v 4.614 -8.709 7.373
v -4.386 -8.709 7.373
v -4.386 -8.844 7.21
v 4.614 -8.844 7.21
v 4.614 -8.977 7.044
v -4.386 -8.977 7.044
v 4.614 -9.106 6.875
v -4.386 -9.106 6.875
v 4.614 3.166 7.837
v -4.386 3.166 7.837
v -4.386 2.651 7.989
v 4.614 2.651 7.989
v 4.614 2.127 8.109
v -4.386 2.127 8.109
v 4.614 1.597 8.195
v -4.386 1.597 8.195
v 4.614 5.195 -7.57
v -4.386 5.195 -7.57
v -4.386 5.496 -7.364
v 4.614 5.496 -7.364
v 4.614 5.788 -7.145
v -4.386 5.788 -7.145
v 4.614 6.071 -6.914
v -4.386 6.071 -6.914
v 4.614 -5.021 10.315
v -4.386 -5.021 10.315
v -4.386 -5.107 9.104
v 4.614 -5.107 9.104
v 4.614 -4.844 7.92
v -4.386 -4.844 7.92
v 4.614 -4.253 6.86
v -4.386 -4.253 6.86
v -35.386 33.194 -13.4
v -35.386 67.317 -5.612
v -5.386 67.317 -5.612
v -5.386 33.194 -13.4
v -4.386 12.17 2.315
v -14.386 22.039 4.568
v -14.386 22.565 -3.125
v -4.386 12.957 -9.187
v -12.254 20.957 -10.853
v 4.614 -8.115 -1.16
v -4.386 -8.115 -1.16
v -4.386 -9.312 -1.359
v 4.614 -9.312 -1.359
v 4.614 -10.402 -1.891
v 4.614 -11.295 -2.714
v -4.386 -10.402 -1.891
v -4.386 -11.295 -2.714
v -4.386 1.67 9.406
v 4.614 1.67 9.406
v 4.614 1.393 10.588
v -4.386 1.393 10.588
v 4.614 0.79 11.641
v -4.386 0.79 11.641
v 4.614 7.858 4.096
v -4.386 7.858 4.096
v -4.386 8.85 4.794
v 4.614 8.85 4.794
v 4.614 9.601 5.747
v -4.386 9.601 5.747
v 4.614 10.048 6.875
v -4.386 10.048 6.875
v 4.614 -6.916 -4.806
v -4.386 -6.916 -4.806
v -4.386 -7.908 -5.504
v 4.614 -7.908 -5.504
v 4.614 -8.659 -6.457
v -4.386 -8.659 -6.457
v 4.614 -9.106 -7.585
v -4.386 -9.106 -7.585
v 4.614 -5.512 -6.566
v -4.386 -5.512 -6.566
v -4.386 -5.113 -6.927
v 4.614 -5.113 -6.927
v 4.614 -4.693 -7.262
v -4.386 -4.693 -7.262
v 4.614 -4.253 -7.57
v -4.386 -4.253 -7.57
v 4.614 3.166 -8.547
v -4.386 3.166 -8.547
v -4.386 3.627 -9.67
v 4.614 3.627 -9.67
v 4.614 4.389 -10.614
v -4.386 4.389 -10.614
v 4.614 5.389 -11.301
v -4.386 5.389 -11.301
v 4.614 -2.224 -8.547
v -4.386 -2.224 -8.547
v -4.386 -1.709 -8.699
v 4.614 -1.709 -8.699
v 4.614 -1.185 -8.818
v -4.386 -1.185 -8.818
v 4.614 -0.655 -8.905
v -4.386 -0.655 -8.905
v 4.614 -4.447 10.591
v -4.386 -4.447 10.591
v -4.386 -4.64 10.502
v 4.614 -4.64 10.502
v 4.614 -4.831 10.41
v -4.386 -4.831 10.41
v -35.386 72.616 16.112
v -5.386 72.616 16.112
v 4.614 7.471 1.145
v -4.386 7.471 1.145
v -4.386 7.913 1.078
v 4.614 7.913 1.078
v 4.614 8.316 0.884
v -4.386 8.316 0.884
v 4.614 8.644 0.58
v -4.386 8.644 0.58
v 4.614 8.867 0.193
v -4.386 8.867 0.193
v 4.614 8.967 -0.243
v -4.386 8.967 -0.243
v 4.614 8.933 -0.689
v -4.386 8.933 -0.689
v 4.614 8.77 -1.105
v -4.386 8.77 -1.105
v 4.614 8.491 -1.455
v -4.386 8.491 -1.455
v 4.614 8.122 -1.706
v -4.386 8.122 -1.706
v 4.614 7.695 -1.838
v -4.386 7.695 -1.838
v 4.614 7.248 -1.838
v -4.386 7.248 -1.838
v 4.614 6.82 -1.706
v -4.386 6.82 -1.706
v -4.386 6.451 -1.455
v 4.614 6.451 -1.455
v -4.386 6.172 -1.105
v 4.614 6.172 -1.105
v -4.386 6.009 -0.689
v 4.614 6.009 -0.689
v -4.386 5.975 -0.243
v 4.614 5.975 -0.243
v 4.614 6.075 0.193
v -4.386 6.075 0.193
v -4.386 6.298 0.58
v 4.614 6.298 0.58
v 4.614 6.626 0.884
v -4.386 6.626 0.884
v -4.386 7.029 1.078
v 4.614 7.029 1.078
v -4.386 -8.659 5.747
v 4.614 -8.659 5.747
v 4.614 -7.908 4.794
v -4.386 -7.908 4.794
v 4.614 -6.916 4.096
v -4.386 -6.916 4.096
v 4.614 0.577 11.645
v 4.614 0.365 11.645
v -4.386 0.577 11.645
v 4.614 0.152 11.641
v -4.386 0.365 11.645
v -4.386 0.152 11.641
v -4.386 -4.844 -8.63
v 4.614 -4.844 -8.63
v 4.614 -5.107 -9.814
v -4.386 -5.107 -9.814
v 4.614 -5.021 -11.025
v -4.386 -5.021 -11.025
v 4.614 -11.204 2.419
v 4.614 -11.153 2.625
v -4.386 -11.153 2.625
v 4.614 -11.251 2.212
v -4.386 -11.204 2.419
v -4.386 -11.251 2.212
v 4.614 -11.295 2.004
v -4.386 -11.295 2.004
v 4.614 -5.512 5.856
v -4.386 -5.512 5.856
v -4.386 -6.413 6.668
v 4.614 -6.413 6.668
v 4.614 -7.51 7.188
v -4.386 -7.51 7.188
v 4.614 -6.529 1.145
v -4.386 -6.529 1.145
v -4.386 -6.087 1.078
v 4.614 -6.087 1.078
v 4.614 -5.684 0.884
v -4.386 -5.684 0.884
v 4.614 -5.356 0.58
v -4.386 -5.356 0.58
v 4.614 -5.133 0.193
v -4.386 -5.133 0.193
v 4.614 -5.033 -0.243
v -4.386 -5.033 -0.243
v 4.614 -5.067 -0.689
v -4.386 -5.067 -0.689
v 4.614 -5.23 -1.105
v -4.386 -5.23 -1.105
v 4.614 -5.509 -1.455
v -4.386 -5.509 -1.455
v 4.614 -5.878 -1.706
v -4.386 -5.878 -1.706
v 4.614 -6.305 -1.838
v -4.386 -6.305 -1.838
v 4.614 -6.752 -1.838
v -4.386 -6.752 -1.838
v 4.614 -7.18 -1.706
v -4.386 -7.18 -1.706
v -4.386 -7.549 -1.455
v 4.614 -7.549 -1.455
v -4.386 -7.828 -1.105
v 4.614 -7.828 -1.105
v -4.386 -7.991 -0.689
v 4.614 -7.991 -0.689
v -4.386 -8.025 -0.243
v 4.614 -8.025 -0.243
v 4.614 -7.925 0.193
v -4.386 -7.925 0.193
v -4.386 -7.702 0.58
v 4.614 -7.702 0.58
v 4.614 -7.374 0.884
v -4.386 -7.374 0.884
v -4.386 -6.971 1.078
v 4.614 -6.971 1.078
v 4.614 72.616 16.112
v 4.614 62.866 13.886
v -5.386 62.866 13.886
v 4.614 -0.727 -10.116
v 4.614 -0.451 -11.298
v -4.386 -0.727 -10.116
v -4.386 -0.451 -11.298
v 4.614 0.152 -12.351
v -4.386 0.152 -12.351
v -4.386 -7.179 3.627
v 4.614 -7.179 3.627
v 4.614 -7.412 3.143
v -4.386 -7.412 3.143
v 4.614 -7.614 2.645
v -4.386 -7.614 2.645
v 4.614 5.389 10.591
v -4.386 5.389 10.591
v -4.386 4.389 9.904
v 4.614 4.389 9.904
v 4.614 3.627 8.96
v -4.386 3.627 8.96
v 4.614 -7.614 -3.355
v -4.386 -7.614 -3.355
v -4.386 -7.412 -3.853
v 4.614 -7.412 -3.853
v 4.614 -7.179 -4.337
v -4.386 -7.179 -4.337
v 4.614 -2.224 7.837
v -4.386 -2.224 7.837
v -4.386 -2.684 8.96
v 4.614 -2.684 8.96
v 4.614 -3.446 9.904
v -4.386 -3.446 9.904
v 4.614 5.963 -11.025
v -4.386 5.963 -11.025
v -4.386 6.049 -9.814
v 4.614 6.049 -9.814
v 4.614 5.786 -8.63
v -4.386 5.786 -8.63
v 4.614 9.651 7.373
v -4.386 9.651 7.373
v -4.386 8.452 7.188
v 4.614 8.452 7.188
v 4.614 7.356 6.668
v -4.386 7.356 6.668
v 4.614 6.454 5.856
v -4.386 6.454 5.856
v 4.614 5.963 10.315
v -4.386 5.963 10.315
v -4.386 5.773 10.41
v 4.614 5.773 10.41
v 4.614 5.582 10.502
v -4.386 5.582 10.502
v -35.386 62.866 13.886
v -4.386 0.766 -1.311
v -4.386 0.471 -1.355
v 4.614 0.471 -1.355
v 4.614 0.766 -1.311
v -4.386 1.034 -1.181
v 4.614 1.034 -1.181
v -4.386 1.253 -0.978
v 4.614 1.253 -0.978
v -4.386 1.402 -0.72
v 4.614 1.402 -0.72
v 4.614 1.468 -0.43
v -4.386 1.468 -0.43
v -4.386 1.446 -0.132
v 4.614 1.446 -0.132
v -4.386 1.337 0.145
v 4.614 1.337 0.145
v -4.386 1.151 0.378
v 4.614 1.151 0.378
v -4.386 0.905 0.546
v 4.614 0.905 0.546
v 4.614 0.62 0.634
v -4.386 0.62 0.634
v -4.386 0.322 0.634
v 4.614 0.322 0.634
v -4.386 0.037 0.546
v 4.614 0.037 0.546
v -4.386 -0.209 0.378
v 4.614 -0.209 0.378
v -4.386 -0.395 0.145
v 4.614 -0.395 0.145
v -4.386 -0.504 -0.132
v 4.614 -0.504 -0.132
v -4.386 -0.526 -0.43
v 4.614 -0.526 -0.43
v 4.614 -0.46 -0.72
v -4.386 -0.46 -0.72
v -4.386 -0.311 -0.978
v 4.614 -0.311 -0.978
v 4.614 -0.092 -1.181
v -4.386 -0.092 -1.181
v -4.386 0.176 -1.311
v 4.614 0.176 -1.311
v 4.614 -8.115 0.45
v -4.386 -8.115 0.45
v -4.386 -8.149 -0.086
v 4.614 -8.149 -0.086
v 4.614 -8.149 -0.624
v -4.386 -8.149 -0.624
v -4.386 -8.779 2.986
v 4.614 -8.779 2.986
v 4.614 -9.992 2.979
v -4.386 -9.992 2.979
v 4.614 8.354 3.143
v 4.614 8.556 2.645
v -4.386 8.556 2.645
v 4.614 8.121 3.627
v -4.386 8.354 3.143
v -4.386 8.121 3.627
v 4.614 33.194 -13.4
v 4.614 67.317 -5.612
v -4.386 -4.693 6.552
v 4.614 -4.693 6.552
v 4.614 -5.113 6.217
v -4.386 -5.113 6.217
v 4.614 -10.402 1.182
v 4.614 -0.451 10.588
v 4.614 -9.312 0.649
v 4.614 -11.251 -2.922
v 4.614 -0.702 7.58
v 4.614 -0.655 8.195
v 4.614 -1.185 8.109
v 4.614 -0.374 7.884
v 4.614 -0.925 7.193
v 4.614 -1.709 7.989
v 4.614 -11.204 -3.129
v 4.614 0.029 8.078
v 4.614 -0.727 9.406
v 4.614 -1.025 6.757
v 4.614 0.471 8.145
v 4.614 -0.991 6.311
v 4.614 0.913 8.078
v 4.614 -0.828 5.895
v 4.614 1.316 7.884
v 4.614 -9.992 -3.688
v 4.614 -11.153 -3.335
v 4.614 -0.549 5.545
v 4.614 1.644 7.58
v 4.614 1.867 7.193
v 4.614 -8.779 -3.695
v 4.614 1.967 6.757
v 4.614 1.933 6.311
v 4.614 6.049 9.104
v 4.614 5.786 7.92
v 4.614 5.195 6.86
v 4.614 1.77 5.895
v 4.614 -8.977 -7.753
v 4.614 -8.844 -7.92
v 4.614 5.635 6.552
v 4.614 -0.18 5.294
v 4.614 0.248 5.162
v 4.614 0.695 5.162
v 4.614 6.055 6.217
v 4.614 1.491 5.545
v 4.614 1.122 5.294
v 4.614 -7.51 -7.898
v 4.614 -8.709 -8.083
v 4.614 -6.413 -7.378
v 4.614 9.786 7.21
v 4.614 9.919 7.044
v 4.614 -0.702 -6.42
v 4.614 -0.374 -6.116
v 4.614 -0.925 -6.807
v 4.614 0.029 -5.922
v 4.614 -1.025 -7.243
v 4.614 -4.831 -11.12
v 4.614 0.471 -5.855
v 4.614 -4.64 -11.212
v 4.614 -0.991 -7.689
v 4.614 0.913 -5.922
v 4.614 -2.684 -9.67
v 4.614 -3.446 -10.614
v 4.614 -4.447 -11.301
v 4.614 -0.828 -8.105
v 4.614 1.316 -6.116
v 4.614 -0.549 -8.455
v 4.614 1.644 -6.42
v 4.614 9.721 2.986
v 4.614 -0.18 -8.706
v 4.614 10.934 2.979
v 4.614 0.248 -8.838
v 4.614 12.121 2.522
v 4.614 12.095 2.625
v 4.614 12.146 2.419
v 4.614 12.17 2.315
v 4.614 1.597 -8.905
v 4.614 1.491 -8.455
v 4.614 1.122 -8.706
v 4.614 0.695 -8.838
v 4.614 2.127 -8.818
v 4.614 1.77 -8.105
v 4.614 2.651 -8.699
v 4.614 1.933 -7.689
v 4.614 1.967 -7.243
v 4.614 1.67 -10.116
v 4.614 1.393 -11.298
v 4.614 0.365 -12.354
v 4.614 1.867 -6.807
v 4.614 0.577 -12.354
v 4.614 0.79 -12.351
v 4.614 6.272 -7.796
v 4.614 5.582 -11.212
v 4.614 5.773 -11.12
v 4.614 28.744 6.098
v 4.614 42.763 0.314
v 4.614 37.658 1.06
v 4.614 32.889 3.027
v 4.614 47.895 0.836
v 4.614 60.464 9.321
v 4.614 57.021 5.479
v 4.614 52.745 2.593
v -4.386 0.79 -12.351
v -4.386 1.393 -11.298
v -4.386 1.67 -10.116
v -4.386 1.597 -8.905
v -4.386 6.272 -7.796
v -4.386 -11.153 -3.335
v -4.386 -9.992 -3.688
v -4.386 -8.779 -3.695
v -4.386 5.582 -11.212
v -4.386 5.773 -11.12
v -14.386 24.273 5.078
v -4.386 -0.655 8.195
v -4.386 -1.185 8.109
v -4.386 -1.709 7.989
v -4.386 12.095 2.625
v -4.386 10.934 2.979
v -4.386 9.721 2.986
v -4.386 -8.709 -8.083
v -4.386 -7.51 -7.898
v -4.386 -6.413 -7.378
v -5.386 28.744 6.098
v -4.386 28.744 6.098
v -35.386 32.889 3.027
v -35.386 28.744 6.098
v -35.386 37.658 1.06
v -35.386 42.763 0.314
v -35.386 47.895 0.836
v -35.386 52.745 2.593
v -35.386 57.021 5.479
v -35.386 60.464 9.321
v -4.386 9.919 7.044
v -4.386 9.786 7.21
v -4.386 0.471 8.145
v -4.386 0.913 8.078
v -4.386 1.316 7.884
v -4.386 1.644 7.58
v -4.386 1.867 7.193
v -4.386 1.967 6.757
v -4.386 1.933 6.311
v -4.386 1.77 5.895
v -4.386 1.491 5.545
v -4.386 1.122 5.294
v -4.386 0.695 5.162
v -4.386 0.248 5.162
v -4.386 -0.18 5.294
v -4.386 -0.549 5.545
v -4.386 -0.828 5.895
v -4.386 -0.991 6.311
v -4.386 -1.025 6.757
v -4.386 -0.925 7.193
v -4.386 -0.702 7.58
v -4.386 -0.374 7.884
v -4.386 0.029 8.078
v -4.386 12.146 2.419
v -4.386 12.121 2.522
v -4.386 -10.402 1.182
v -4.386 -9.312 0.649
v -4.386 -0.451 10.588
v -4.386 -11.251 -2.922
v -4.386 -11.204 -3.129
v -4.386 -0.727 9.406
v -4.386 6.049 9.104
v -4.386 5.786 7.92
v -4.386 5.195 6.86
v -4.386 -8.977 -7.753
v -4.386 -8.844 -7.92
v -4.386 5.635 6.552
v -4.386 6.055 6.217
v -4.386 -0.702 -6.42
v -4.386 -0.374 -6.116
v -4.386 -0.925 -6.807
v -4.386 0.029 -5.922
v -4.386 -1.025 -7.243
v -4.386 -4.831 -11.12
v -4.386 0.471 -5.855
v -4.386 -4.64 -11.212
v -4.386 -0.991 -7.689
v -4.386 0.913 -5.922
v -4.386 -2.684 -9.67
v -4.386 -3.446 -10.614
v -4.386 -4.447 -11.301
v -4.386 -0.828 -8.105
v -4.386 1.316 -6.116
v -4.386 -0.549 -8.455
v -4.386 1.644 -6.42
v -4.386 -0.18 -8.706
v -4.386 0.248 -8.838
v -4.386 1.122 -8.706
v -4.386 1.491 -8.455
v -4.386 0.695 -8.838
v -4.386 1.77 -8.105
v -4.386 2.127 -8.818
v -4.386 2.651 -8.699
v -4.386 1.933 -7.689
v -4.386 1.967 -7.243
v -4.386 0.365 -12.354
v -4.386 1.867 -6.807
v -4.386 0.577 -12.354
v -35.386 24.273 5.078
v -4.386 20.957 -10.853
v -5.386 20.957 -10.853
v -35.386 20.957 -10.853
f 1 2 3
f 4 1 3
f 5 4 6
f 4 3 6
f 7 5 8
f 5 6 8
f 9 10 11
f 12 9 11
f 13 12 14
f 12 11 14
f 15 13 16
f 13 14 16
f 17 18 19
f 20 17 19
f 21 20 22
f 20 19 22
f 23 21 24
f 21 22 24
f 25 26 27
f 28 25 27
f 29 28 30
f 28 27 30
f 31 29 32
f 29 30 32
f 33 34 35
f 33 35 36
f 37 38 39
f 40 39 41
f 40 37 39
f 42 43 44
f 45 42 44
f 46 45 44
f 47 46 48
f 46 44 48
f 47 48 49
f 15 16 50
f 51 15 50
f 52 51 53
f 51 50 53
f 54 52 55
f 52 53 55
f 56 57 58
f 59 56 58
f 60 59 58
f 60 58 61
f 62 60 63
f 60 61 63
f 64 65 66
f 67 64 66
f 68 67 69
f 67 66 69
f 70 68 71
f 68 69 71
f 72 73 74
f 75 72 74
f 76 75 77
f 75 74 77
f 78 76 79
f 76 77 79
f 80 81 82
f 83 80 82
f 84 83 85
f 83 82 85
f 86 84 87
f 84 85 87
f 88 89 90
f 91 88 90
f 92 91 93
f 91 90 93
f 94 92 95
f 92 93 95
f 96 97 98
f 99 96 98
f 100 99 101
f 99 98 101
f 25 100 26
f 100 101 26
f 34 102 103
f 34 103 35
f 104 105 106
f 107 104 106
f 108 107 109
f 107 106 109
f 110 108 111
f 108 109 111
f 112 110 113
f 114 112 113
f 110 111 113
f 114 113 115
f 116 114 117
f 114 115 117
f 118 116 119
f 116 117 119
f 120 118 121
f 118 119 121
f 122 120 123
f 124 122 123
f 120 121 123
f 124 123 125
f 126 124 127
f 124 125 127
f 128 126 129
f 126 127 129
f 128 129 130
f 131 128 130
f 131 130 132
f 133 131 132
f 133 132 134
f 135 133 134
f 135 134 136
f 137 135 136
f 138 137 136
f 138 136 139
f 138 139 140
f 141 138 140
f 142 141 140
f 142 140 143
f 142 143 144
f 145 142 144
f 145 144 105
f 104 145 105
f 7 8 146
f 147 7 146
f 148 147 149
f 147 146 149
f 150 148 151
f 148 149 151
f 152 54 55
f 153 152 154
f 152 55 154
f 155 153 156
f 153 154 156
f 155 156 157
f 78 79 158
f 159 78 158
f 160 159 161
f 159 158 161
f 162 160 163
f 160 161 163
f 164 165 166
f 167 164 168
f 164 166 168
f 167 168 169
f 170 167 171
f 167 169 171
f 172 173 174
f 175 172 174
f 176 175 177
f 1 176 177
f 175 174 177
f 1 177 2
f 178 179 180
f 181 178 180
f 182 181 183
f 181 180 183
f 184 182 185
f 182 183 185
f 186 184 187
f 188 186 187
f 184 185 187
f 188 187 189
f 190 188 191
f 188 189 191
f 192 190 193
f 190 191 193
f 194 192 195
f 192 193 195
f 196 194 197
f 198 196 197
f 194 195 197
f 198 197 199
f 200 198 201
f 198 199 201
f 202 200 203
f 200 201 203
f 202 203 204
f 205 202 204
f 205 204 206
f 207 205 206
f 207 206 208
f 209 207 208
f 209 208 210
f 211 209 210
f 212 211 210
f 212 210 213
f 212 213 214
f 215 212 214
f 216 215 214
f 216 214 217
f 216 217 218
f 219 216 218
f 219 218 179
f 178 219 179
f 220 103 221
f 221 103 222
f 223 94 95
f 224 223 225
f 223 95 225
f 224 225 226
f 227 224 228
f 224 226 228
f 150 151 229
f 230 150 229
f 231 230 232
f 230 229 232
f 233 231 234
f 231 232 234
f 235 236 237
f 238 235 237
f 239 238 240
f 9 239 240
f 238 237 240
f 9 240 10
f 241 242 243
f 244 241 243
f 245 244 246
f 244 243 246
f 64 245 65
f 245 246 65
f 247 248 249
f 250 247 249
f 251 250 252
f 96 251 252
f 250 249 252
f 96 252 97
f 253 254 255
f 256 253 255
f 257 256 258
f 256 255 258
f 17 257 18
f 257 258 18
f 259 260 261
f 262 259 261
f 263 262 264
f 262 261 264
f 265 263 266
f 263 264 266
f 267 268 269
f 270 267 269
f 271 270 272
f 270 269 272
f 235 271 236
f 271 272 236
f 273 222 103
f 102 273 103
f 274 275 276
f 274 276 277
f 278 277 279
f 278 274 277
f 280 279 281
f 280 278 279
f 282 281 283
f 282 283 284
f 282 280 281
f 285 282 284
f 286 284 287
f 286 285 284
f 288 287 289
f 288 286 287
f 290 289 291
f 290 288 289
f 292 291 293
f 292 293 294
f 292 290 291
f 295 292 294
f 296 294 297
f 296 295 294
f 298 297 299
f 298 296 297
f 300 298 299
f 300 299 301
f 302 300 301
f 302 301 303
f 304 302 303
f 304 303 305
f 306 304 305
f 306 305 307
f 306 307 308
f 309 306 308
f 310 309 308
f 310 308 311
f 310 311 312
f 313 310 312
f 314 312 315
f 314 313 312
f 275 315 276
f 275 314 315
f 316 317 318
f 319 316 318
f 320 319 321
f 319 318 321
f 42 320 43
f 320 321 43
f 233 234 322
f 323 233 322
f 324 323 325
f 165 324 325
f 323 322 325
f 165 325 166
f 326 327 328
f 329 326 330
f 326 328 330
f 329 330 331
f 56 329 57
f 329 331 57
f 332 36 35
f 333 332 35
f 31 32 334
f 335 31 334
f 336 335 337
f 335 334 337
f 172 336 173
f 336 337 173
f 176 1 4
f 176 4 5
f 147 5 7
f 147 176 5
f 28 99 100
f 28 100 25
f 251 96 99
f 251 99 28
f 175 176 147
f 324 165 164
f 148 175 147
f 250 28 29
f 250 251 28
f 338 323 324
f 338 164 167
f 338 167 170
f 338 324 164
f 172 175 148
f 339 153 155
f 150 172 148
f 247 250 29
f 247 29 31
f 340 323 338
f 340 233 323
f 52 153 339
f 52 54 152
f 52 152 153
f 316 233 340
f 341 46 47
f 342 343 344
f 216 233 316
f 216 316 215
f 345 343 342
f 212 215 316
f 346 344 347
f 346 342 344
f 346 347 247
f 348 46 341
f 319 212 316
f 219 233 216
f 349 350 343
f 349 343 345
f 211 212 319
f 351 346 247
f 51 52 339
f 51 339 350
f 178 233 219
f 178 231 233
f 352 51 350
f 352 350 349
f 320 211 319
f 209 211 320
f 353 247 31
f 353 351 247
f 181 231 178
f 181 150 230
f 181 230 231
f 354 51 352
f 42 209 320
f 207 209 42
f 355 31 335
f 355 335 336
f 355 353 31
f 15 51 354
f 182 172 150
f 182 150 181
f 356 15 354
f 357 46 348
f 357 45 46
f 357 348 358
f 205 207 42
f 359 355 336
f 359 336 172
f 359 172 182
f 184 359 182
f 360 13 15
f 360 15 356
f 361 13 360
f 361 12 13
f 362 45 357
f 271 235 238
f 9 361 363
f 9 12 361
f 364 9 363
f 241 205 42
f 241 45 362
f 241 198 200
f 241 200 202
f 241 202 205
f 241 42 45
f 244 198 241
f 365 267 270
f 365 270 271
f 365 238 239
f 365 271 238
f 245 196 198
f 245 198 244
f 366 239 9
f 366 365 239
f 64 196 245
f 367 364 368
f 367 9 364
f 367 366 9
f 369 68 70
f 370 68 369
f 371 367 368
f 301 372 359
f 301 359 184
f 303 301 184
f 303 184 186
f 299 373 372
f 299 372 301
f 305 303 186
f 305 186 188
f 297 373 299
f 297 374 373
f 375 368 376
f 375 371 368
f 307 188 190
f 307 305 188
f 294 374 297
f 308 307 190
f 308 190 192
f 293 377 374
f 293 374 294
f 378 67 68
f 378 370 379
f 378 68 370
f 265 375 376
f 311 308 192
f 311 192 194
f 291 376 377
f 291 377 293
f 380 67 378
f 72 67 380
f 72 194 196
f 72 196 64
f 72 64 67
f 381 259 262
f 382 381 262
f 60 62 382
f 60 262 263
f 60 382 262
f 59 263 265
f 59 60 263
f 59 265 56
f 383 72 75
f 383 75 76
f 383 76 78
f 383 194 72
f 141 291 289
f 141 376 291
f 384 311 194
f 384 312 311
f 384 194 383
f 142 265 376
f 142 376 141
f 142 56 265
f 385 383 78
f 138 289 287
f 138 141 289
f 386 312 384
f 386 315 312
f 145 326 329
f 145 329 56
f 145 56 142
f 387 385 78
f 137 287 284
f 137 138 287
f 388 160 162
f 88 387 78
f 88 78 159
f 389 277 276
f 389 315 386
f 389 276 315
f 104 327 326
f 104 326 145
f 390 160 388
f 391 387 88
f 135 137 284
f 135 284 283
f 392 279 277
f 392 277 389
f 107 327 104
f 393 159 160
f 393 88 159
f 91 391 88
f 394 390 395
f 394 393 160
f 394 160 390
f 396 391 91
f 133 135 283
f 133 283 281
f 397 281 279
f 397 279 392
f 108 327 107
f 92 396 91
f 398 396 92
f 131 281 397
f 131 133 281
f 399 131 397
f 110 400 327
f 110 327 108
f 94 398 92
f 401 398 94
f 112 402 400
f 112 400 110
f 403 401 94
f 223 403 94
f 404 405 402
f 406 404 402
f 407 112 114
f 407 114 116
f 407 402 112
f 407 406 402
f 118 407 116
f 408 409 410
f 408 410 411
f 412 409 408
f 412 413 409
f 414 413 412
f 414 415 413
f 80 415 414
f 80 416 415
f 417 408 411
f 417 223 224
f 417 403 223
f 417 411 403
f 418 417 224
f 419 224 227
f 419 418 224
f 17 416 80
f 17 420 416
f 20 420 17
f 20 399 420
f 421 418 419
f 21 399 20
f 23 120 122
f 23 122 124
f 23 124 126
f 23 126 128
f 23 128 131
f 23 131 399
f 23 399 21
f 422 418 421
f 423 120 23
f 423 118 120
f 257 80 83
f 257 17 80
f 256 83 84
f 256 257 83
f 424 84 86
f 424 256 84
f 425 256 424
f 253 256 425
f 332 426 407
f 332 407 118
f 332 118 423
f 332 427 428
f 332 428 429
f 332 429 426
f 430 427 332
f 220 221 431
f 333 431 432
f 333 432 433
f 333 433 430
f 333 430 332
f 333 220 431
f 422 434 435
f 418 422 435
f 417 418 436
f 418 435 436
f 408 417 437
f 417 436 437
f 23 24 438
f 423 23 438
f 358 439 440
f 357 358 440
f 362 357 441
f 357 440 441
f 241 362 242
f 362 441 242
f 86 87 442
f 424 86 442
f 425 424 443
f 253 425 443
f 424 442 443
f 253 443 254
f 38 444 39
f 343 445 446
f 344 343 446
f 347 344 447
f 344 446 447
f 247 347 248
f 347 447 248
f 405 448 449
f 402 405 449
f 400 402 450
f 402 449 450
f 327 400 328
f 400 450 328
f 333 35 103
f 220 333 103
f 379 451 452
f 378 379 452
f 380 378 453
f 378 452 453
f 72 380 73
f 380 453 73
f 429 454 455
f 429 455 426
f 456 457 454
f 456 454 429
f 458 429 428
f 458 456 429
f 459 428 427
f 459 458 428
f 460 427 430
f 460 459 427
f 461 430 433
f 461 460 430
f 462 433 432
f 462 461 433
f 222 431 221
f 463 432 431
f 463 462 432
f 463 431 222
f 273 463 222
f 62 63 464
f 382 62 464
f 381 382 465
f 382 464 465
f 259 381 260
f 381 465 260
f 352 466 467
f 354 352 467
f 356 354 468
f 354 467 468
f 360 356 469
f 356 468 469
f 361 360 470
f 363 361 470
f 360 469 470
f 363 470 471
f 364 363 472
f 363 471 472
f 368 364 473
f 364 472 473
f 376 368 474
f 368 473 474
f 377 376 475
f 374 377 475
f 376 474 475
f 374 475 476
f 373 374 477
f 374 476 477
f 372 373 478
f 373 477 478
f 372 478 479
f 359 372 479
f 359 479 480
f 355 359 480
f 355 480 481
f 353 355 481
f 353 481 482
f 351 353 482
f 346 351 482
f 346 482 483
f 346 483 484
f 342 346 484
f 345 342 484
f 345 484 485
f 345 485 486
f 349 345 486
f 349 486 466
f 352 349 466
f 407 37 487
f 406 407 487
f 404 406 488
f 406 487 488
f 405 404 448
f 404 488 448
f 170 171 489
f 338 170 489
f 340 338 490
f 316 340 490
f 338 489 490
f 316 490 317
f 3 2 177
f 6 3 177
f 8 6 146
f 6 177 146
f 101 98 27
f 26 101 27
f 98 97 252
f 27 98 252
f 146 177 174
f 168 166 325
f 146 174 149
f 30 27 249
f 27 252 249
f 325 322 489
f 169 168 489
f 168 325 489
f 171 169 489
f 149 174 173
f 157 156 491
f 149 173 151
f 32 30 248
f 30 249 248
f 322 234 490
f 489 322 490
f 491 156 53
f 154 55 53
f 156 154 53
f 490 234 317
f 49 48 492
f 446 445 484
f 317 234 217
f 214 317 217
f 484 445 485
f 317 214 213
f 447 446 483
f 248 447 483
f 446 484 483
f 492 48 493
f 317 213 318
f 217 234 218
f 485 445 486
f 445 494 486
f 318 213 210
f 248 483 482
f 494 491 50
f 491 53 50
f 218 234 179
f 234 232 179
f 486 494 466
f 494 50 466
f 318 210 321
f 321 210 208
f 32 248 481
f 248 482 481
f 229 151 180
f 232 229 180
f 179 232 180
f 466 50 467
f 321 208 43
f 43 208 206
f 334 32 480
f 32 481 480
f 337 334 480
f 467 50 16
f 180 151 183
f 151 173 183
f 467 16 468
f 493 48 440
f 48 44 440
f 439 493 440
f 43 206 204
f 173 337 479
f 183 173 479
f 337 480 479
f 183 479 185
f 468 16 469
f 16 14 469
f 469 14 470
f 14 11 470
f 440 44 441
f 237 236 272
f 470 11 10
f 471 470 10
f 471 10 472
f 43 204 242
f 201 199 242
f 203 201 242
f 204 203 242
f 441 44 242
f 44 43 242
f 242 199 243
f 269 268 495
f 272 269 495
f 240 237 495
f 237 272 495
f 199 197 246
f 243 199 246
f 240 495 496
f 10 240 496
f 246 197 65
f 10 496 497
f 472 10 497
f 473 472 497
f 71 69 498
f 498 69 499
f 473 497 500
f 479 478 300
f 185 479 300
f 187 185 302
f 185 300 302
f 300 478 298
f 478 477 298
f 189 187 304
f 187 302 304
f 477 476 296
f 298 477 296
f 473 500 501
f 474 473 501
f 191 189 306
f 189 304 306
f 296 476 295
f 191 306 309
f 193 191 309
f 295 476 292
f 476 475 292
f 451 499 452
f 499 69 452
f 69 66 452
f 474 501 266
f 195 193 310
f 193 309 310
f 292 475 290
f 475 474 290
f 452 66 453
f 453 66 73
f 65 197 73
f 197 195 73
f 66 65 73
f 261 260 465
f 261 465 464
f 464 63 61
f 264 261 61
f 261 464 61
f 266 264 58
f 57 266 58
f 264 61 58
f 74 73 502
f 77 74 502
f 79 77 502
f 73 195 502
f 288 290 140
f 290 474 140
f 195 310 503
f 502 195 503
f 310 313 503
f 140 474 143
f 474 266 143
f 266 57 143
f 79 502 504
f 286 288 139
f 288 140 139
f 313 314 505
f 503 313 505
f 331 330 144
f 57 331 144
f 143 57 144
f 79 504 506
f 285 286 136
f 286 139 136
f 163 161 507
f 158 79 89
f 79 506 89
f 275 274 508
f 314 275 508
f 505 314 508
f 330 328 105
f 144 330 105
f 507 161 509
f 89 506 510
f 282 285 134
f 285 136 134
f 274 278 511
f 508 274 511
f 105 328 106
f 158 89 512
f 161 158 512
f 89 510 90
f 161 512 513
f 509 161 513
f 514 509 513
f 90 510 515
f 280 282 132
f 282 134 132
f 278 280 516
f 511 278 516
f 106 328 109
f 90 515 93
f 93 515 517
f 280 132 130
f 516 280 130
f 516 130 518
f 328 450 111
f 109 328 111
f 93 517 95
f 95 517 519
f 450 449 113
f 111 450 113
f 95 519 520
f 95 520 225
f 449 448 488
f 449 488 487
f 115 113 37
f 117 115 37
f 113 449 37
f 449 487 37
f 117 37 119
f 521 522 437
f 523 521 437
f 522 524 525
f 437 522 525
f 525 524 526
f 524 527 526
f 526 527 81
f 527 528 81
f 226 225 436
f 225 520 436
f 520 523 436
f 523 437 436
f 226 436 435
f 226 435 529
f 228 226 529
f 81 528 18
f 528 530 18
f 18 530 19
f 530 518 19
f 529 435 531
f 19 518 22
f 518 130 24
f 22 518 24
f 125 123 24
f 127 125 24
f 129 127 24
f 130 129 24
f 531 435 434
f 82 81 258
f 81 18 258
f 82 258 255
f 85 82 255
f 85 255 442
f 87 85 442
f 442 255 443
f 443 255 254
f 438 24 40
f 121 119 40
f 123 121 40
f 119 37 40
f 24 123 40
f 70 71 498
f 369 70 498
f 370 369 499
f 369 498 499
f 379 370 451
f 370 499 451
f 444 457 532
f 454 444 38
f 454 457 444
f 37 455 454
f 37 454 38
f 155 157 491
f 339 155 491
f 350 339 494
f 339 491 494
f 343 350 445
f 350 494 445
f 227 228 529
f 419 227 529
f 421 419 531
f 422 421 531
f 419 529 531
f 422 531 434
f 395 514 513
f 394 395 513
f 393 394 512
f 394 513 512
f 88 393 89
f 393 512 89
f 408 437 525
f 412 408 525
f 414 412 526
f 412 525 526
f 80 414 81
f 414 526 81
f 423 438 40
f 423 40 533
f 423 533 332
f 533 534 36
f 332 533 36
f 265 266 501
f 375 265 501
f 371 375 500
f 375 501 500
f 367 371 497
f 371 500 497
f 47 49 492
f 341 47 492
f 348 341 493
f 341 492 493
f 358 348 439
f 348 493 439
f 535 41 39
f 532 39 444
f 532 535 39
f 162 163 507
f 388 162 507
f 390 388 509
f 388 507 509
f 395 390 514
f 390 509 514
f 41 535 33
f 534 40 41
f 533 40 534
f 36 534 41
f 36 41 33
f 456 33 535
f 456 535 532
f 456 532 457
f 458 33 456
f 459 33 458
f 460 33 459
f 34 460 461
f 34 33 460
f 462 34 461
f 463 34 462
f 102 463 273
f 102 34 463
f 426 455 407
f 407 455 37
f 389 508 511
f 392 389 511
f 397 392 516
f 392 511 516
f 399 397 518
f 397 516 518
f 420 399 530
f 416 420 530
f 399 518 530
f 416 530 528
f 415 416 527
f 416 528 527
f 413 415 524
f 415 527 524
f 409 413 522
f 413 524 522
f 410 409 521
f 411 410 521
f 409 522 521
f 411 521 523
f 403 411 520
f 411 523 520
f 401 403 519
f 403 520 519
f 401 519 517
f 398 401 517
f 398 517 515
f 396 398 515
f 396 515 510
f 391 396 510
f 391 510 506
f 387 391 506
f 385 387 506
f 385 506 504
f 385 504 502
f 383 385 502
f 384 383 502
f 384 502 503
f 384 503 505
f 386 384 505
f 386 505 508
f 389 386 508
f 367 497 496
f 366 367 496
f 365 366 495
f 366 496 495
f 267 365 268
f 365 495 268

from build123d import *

# Parameters (mm, degrees)
BOSS_EXTRUDE1_START     = -9
BOSS_EXTRUDE1_OUTLINE_R = 1
BOSS_EXTRUDE1_DEPTH     = 9
BOSS_EXTRUDE1_START_2   = -10
BOSS_EXTRUDE1_2_DEPTH   = 1
BOSS_EXTRUDE2_START     = -40
BOSS_EXTRUDE2_DEPTH     = 40
CUT_EXTRUDE6_DEPTH      = 31
BOSS_EXTRUDE5_DEPTH     = 10
CHAMFER5_SIZE           = 10
SKETCH17_R              = 1.5000000000000002
SKETCH17_R_2            = 1.5000000000000004
SKETCH17_R_3            = 1.5
CUT_EXTRUDE7_DEPTH      = 81.58306320285853


with BuildPart() as part:
    # Boss-Extrude1: read off the stored shape, not the designer's step
    # Boss-Extrude1 outline → Boss-Extrude1 (new body)
    with BuildSketch(Plane(origin=(4.6139639648499715, 0, 0), x_dir=(0, 0, -1), z_dir=(1, 0, 0)).offset(BOSS_EXTRUDE1_START)):
        with BuildLine():
            ThreePointArc((-10.591117285, -4.446613705), (-10.456680456, -4.73552608), (-10.314619658, -5.020766944))
            ThreePointArc((-10.314619658, -5.020766944), (-8.502494616, -5.018593908), (-6.859954563, -4.253176333))
            ThreePointArc((-6.859954563, -4.253176333), (-6.387568746, -4.905897262), (-5.856328627, -5.51168345))
            ThreePointArc((-5.856328627, -5.51168345), (-6.968055133, -6.942720161), (-7.373409443, -8.708927899))
            ThreePointArc((-7.373409443, -8.708927899), (-7.126931664, -8.910899), (-6.875177934, -9.106254268))
            ThreePointArc((-6.875177934, -9.106254268), (-5.243452532, -8.318044841), (-4.095677319, -6.915756016))
            ThreePointArc((-4.095677319, -6.915756016), (-3.386867407, -7.298876727), (-2.645395822, -7.614174775))
            ThreePointArc((-2.645395822, -7.614174775), (-3.026123234, -9.385854353), (-2.625006031, -11.153029182))
            ThreePointArc((-2.625006031, -11.153029182), (-2.315305249, -11.228056157), (-2.003721502, -11.294833322))
            ThreePointArc((-2.003721502, -11.294833322), (-0.875578967, -9.876702048), (-0.449899552, -8.115282471))
            ThreePointArc((-0.449899552, -8.115282471), (0.354945958, -8.15292121), (1.159791469, -8.115282471))
            ThreePointArc((1.159791469, -8.115282471), (1.585470883, -9.876702048), (2.713613419, -11.294833322))
            ThreePointArc((2.713613419, -11.294833322), (3.025197166, -11.228056157), (3.334897948, -11.153029182))
            ThreePointArc((3.334897948, -11.153029182), (3.736015151, -9.385854353), (3.355287739, -7.614174775))
            ThreePointArc((3.355287739, -7.614174775), (4.096759324, -7.298876727), (4.805569236, -6.915756016))
            ThreePointArc((4.805569236, -6.915756016), (5.953344449, -8.318044841), (7.585069851, -9.106254268))
            ThreePointArc((7.585069851, -9.106254268), (7.836823581, -8.910899), (8.083301359, -8.708927899))
            ThreePointArc((8.083301359, -8.708927899), (7.677947049, -6.942720161), (6.566220544, -5.51168345))
            ThreePointArc((6.566220544, -5.51168345), (7.097460663, -4.905897262), (7.56984648, -4.253176333))
            ThreePointArc((7.56984648, -4.253176333), (9.212386533, -5.018593908), (11.024511575, -5.020766944))
            ThreePointArc((11.024511575, -5.020766944), (11.166572373, -4.73552608), (11.301009202, -4.446613705))
            ThreePointArc((11.301009202, -4.446613705), (10.169468771, -3.031192163), (8.546934241, -2.224232691))
            ThreePointArc((8.546934241, -2.224232691), (8.762724273, -1.447941745), (8.90512419, -0.654899984))
            ThreePointArc((8.90512419, -0.654899984), (10.717103882, -0.631845971), (12.350714974, 0.152447781))
            ThreePointArc((12.350714974, 0.152447781), (12.354945958, 0.47107879), (12.350714974, 0.789709799))
            ThreePointArc((12.350714974, 0.789709799), (10.717103881, 1.57400355), (8.90512419, 1.597057563))
            ThreePointArc((8.90512419, 1.597057563), (8.762724273, 2.390099324), (8.546934241, 3.16639027))
            ThreePointArc((8.546934241, 3.16639027), (10.169468771, 3.973349742), (11.301009202, 5.388771284))
            ThreePointArc((11.301009202, 5.388771284), (11.166572373, 5.677683659), (11.024511575, 5.962924523))
            ThreePointArc((11.024511575, 5.962924523), (9.212386533, 5.960751487), (7.56984648, 5.195333912))
            ThreePointArc((7.56984648, 5.195333912), (7.255600261, 5.643539152), (6.913552392, 6.070905362))
            Line((6.913552392, 6.070905362), (7.795891782, 6.27229357))
            Line((7.795891782, 6.27229357), (13.400397117, 33.194406922))
            Line((13.400397117, 33.194406922), (5.612164429, 67.316883848))
            Line((5.612164429, 67.316883848), (-16.111603154, 72.615744291))
            Line((-16.111603154, 72.615744291), (-13.886393815, 62.866465169))
            ThreePointArc((-13.886393815, 62.866465169), (-0.835936603, 47.895101758), (-6.098161126, 28.743988243))
            Line((-6.098161126, 28.743988243), (-2.315305249, 12.170213736))
            ThreePointArc((-2.315305249, 12.170213736), (-2.470404693, 12.133728304), (-2.625006031, 12.095186762))
            ThreePointArc((-2.625006031, 12.095186762), (-3.026123234, 10.328011932), (-2.645395822, 8.556332354))
            ThreePointArc((-2.645395822, 8.556332354), (-3.386867407, 8.241034306), (-4.095677319, 7.857913595))
            ThreePointArc((-4.095677319, 7.857913595), (-5.243452532, 9.260202421), (-6.875177934, 10.048411847))
            ThreePointArc((-6.875177934, 10.048411847), (-7.126931664, 9.853056579), (-7.373409443, 9.651085478))
            ThreePointArc((-7.373409443, 9.651085478), (-6.968055133, 7.88487774), (-5.856328627, 6.45384103))
            ThreePointArc((-5.856328627, 6.45384103), (-6.387568746, 5.848054841), (-6.859954563, 5.195333912))
            ThreePointArc((-6.859954563, 5.195333912), (-8.502494616, 5.960751487), (-10.314619658, 5.962924523))
            ThreePointArc((-10.314619658, 5.962924523), (-10.456680456, 5.677683659), (-10.591117285, 5.388771284))
            ThreePointArc((-10.591117285, 5.388771284), (-9.459576854, 3.973349742), (-7.837042324, 3.16639027))
            ThreePointArc((-7.837042324, 3.16639027), (-8.052832356, 2.390099324), (-8.195232274, 1.597057563))
            ThreePointArc((-8.195232274, 1.597057563), (-10.007211965, 1.57400355), (-11.640823057, 0.789709799))
            ThreePointArc((-11.640823057, 0.789709799), (-11.645054042, 0.47107879), (-11.640823057, 0.152447781))
            ThreePointArc((-11.640823057, 0.152447781), (-10.007211965, -0.631845971), (-8.195232274, -0.654899984))
            ThreePointArc((-8.195232274, -0.654899984), (-8.052832356, -1.447941745), (-7.837042324, -2.224232691))
            ThreePointArc((-7.837042324, -2.224232691), (-9.459576854, -3.031192163), (-10.591117285, -4.446613705))
        make_face()
        with Locations((0.354945958, 0.47107879)):
            Circle(BOSS_EXTRUDE1_OUTLINE_R, mode=Mode.SUBTRACT)
    extrude(amount=BOSS_EXTRUDE1_DEPTH)

    # Boss-Extrude1 2 outline → Boss-Extrude1 2 (add)
    with BuildSketch(Plane(origin=(4.6139639648499715, 0, 0), x_dir=(0, 0, -1), z_dir=(1, 0, 0)).offset(BOSS_EXTRUDE1_START_2)):
        with BuildLine():
            Line((-6.098161126, 28.743988243), (-0.535137777, 4.370790438))
            Line((-0.535137777, 4.370790438), (7.795891782, 6.27229357))
            Line((7.795891782, 6.27229357), (13.400397117, 33.194406922))
            Line((13.400397117, 33.194406922), (5.612164429, 67.316883848))
            Line((5.612164429, 67.316883848), (-16.111603154, 72.615744291))
            Line((-16.111603154, 72.615744291), (-13.886393815, 62.866465169))
            ThreePointArc((-13.886393815, 62.866465169), (-0.835936603, 47.895101758), (-6.098161126, 28.743988243))
        make_face()
    extrude(amount=BOSS_EXTRUDE1_2_DEPTH)

    # Sketch2 → Boss-Extrude2 (add)
    with BuildSketch(Plane(origin=(4.6139639648499715, 0, 0), x_dir=(0, 0, -1), z_dir=(1, 0, 0)).offset(BOSS_EXTRUDE2_START)):
        with BuildLine():
            Line((-16.11160315441779, 72.61574429110016), (5.612164428781802, 67.31688384840837))
            Line((5.612164428781802, 67.31688384840837), (13.400397117252913, 33.19440692204444))
            Line((13.400397117252913, 33.19440692204444), (8.3052597658331, 8.719121931463299))
            Line((8.3052597658331, 8.719121931463299), (-1.647742447257206, 9.245429999281619))
            Line((-1.647742447257206, 9.245429999281619), (-6.098161126383539, 28.743988242918082))
            ThreePointArc((-6.098161126383539, 28.743988242918082), (-0.8359366030316124, 47.895101758418704), (-13.886393814854628, 62.866465169281916))
            Line((-13.886393814854628, 62.866465169281916), (-16.11160315441779, 72.61574429110016))
        make_face()
    extrude(amount=BOSS_EXTRUDE2_DEPTH)

    # Sketch13 → Cut-Extrude6 (cut)
    with BuildSketch(Plane.ZY.offset(35.386036035150035)):
        Polygon((-7.7958917817334035, 6.272293570213381), (-10.852828441543005, 20.95676442675387), (5.0777102899861175, 24.273101006715667), (0.5351377774756237, 4.370790438372502), align=None)
    extrude(amount=-CUT_EXTRUDE6_DEPTH, mode=Mode.SUBTRACT)

    # Sketch15 → Boss-Extrude5 (add)
    with BuildSketch(Plane.ZY.offset(4.3860360351500285)):
        Polygon((-10.852828441543005, 20.95676442675387), (5.077710289986116, 24.273101006715674), (2.315305249124831, 12.17021373582128), (-9.187430109019209, 12.956764426753871), align=None)
    extrude(amount=BOSS_EXTRUDE5_DEPTH)

    # Chamfer5
    chamfer5_edges = [part.edges().sort_by_distance(p)[0] for p in [
        (-14.386036035150028, 12.563489081287575, -3.436062429947189),
    ]]
    chamfer(chamfer5_edges, length=CHAMFER5_SIZE - 0.0001)  # a hair under: the kernel refuses the full size

    # Sketch17 → Cut-Extrude7 (cut, through all)
    with BuildSketch(Plane.ZY.offset(4.3860360351500285)):
        with Locations((-0.35494595834961384, 7.471078789645248)):
            Circle(SKETCH17_R)
        with Locations((6.645054041650483, 0.47107878964532196)):
            Circle(SKETCH17_R)
        with Locations((-0.354945958349467, -6.528921210354753)):
            Circle(SKETCH17_R_2)
        with Locations((-7.354945958349516, 0.4710787896452233)):
            Circle(SKETCH17_R_3)
    extrude(amount=-CUT_EXTRUDE7_DEPTH, mode=Mode.SUBTRACT)


solid = part.part
